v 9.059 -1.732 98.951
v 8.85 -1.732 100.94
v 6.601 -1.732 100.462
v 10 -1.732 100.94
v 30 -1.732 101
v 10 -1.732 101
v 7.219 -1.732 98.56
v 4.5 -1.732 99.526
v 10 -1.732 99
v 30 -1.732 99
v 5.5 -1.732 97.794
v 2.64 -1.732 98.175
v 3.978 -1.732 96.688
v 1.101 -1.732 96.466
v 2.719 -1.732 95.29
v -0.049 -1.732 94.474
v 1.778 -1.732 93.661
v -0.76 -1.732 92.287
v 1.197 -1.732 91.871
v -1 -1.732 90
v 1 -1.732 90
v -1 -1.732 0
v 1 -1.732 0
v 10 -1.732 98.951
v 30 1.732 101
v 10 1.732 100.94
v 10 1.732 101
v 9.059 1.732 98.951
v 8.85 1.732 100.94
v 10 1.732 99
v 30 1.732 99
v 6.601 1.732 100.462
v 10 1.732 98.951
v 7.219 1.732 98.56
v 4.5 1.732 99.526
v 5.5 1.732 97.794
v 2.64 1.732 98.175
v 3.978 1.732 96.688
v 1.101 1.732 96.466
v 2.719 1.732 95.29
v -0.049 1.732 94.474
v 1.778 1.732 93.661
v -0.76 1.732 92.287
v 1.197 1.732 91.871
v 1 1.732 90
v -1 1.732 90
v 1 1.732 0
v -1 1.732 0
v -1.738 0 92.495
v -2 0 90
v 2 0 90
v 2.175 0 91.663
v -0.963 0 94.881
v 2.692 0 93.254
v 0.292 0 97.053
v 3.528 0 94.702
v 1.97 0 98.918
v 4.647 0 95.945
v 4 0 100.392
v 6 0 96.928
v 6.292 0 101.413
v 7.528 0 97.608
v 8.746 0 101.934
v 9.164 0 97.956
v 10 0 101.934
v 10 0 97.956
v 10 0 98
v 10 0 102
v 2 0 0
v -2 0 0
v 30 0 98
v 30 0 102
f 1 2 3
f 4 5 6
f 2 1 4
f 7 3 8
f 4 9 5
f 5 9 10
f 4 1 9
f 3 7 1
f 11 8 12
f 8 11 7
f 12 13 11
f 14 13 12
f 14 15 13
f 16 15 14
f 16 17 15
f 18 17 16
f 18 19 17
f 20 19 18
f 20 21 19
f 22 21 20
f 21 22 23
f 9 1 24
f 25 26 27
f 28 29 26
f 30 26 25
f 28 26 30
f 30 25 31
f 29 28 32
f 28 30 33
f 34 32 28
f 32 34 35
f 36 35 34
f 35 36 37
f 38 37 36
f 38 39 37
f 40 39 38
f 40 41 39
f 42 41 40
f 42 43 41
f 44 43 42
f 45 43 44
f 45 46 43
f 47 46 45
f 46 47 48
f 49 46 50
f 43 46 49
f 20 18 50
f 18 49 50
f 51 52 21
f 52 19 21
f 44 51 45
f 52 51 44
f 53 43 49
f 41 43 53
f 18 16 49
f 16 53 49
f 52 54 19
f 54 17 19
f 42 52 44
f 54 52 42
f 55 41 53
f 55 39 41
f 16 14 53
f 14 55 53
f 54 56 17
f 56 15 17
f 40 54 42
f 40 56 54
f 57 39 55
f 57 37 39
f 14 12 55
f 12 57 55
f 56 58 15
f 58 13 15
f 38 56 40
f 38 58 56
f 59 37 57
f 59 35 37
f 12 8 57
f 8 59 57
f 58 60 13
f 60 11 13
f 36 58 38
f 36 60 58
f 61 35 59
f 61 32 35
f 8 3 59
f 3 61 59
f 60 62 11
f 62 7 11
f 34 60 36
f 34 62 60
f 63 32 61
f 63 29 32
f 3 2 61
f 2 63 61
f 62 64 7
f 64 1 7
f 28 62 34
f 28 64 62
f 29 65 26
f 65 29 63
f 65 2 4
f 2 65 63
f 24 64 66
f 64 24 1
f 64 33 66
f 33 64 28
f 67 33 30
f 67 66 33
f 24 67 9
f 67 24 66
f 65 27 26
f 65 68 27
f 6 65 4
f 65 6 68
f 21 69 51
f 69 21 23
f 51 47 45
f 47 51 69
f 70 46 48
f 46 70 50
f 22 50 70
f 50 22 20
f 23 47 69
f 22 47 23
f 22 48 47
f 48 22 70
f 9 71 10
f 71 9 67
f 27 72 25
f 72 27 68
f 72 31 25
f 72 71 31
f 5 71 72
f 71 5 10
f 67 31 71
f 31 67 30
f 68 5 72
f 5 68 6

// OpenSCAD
// file: global_preferences.scad
color_electronics = [1, 0, 0];
color_hardware = [0, 0, 1];

flipper_rotation_angle = 45; //Degrees rotation when activated.
// file: physical_dimensions.scad
//Physically bound settings.
printing_play = 0.2; //Horizontal error in 3D printing.
printing_overhang = 50; //Maximum overhang angle. 90 is perfect bridging. 0 is no overhang possible.
movement_play = 0.2; //Play to leave if stuff has to move past each other.

m3_bolt_radius = 1.5;
m3_nut_radius = 5.5 / 2;
m3_nut_height = 2.4;

ball_radius = 15; //Standard pinball size (7/6 inch).
ball_slit = ball_radius * 2 + movement_play * 2 + 4; //Allow 4mm extra space to make the ball fall through faster.

cabinet_thickness = 10; //1cm wooden planks.

flipper_solenoid_width = 13;
flipper_solenoid_height = 15;
flipper_solenoid_length = 30;
flipper_solenoid_pin_radius = 2;
flipper_solenoid_pin_retracted = 8.5; //Length when retracted.
flipper_solenoid_pin_expansion = 10; //Additional length when expanded.
flipper_solenoid_pinhole_position = 2.5; //Distance from centre of hole to tip of pin.
flipper_solenoid_pinhole_radius = m3_bolt_radius;
flipper_solenoid_pingap_thickness = 1.6;
flipper_solenoid_pingap_depth = 7;
flipper_solenoid_screw_radius = m3_bolt_radius;
flipper_solenoid_screw1_position = 8; //Distance from front.
flipper_solenoid_screw2_position = 15 + flipper_solenoid_screw1_position;
flipper_solenoid_screw_depth = 4; //Unknown.

hexkey_radius = 2; //Radius of circumscribed circle around hex key.
hexkey_short_length = 30; //Length of short end.//TODO: How long is this?
hexkey_long_length = 100; //TODO: How long is this?
hexkey_turn_radius = 10; //TODO: Also unknown.

matrix_size = [320, 160]; //Size of LED matrix.

playfield_width = 610;
playfield_height = 1220;
playfield_slope = 6; //Degrees.
playfield_thickness = 18;

space_bottom = 100;
space_top = 100;
space_top_back = 200;

spring_end_thickness = 2; //How thick the attachment part of the spring is.
spring_radius = 4; //Radius of the coil of the spring.
// main file
include <physical_dimensions.scad>
include <global_preferences.scad>

module hexkey() {
	color(color_hardware) {
		cylinder($fn=6, r=hexkey_radius, h=hexkey_long_length - hexkey_turn_radius);
		translate([hexkey_turn_radius, 0, hexkey_long_length - hexkey_turn_radius]) {
			intersection() {
				rotate([90, 0, 0]) {
					rotate_extrude() {
						translate([-hexkey_turn_radius, 0, 0]) {
							circle($fn=6, r=hexkey_radius);
						}
					}
				}
				translate([-hexkey_turn_radius - hexkey_radius, -hexkey_radius, 0]) {
					cube(hexkey_turn_radius + hexkey_radius);
				}
			}
		}
		translate([hexkey_turn_radius, 0, hexkey_long_length]) {
			rotate([0, 90, 0]) {
				cylinder($fn=6, r=hexkey_radius, h=hexkey_short_length - hexkey_turn_radius);
			}
		}
	}
}

//Debug.
hexkey();
